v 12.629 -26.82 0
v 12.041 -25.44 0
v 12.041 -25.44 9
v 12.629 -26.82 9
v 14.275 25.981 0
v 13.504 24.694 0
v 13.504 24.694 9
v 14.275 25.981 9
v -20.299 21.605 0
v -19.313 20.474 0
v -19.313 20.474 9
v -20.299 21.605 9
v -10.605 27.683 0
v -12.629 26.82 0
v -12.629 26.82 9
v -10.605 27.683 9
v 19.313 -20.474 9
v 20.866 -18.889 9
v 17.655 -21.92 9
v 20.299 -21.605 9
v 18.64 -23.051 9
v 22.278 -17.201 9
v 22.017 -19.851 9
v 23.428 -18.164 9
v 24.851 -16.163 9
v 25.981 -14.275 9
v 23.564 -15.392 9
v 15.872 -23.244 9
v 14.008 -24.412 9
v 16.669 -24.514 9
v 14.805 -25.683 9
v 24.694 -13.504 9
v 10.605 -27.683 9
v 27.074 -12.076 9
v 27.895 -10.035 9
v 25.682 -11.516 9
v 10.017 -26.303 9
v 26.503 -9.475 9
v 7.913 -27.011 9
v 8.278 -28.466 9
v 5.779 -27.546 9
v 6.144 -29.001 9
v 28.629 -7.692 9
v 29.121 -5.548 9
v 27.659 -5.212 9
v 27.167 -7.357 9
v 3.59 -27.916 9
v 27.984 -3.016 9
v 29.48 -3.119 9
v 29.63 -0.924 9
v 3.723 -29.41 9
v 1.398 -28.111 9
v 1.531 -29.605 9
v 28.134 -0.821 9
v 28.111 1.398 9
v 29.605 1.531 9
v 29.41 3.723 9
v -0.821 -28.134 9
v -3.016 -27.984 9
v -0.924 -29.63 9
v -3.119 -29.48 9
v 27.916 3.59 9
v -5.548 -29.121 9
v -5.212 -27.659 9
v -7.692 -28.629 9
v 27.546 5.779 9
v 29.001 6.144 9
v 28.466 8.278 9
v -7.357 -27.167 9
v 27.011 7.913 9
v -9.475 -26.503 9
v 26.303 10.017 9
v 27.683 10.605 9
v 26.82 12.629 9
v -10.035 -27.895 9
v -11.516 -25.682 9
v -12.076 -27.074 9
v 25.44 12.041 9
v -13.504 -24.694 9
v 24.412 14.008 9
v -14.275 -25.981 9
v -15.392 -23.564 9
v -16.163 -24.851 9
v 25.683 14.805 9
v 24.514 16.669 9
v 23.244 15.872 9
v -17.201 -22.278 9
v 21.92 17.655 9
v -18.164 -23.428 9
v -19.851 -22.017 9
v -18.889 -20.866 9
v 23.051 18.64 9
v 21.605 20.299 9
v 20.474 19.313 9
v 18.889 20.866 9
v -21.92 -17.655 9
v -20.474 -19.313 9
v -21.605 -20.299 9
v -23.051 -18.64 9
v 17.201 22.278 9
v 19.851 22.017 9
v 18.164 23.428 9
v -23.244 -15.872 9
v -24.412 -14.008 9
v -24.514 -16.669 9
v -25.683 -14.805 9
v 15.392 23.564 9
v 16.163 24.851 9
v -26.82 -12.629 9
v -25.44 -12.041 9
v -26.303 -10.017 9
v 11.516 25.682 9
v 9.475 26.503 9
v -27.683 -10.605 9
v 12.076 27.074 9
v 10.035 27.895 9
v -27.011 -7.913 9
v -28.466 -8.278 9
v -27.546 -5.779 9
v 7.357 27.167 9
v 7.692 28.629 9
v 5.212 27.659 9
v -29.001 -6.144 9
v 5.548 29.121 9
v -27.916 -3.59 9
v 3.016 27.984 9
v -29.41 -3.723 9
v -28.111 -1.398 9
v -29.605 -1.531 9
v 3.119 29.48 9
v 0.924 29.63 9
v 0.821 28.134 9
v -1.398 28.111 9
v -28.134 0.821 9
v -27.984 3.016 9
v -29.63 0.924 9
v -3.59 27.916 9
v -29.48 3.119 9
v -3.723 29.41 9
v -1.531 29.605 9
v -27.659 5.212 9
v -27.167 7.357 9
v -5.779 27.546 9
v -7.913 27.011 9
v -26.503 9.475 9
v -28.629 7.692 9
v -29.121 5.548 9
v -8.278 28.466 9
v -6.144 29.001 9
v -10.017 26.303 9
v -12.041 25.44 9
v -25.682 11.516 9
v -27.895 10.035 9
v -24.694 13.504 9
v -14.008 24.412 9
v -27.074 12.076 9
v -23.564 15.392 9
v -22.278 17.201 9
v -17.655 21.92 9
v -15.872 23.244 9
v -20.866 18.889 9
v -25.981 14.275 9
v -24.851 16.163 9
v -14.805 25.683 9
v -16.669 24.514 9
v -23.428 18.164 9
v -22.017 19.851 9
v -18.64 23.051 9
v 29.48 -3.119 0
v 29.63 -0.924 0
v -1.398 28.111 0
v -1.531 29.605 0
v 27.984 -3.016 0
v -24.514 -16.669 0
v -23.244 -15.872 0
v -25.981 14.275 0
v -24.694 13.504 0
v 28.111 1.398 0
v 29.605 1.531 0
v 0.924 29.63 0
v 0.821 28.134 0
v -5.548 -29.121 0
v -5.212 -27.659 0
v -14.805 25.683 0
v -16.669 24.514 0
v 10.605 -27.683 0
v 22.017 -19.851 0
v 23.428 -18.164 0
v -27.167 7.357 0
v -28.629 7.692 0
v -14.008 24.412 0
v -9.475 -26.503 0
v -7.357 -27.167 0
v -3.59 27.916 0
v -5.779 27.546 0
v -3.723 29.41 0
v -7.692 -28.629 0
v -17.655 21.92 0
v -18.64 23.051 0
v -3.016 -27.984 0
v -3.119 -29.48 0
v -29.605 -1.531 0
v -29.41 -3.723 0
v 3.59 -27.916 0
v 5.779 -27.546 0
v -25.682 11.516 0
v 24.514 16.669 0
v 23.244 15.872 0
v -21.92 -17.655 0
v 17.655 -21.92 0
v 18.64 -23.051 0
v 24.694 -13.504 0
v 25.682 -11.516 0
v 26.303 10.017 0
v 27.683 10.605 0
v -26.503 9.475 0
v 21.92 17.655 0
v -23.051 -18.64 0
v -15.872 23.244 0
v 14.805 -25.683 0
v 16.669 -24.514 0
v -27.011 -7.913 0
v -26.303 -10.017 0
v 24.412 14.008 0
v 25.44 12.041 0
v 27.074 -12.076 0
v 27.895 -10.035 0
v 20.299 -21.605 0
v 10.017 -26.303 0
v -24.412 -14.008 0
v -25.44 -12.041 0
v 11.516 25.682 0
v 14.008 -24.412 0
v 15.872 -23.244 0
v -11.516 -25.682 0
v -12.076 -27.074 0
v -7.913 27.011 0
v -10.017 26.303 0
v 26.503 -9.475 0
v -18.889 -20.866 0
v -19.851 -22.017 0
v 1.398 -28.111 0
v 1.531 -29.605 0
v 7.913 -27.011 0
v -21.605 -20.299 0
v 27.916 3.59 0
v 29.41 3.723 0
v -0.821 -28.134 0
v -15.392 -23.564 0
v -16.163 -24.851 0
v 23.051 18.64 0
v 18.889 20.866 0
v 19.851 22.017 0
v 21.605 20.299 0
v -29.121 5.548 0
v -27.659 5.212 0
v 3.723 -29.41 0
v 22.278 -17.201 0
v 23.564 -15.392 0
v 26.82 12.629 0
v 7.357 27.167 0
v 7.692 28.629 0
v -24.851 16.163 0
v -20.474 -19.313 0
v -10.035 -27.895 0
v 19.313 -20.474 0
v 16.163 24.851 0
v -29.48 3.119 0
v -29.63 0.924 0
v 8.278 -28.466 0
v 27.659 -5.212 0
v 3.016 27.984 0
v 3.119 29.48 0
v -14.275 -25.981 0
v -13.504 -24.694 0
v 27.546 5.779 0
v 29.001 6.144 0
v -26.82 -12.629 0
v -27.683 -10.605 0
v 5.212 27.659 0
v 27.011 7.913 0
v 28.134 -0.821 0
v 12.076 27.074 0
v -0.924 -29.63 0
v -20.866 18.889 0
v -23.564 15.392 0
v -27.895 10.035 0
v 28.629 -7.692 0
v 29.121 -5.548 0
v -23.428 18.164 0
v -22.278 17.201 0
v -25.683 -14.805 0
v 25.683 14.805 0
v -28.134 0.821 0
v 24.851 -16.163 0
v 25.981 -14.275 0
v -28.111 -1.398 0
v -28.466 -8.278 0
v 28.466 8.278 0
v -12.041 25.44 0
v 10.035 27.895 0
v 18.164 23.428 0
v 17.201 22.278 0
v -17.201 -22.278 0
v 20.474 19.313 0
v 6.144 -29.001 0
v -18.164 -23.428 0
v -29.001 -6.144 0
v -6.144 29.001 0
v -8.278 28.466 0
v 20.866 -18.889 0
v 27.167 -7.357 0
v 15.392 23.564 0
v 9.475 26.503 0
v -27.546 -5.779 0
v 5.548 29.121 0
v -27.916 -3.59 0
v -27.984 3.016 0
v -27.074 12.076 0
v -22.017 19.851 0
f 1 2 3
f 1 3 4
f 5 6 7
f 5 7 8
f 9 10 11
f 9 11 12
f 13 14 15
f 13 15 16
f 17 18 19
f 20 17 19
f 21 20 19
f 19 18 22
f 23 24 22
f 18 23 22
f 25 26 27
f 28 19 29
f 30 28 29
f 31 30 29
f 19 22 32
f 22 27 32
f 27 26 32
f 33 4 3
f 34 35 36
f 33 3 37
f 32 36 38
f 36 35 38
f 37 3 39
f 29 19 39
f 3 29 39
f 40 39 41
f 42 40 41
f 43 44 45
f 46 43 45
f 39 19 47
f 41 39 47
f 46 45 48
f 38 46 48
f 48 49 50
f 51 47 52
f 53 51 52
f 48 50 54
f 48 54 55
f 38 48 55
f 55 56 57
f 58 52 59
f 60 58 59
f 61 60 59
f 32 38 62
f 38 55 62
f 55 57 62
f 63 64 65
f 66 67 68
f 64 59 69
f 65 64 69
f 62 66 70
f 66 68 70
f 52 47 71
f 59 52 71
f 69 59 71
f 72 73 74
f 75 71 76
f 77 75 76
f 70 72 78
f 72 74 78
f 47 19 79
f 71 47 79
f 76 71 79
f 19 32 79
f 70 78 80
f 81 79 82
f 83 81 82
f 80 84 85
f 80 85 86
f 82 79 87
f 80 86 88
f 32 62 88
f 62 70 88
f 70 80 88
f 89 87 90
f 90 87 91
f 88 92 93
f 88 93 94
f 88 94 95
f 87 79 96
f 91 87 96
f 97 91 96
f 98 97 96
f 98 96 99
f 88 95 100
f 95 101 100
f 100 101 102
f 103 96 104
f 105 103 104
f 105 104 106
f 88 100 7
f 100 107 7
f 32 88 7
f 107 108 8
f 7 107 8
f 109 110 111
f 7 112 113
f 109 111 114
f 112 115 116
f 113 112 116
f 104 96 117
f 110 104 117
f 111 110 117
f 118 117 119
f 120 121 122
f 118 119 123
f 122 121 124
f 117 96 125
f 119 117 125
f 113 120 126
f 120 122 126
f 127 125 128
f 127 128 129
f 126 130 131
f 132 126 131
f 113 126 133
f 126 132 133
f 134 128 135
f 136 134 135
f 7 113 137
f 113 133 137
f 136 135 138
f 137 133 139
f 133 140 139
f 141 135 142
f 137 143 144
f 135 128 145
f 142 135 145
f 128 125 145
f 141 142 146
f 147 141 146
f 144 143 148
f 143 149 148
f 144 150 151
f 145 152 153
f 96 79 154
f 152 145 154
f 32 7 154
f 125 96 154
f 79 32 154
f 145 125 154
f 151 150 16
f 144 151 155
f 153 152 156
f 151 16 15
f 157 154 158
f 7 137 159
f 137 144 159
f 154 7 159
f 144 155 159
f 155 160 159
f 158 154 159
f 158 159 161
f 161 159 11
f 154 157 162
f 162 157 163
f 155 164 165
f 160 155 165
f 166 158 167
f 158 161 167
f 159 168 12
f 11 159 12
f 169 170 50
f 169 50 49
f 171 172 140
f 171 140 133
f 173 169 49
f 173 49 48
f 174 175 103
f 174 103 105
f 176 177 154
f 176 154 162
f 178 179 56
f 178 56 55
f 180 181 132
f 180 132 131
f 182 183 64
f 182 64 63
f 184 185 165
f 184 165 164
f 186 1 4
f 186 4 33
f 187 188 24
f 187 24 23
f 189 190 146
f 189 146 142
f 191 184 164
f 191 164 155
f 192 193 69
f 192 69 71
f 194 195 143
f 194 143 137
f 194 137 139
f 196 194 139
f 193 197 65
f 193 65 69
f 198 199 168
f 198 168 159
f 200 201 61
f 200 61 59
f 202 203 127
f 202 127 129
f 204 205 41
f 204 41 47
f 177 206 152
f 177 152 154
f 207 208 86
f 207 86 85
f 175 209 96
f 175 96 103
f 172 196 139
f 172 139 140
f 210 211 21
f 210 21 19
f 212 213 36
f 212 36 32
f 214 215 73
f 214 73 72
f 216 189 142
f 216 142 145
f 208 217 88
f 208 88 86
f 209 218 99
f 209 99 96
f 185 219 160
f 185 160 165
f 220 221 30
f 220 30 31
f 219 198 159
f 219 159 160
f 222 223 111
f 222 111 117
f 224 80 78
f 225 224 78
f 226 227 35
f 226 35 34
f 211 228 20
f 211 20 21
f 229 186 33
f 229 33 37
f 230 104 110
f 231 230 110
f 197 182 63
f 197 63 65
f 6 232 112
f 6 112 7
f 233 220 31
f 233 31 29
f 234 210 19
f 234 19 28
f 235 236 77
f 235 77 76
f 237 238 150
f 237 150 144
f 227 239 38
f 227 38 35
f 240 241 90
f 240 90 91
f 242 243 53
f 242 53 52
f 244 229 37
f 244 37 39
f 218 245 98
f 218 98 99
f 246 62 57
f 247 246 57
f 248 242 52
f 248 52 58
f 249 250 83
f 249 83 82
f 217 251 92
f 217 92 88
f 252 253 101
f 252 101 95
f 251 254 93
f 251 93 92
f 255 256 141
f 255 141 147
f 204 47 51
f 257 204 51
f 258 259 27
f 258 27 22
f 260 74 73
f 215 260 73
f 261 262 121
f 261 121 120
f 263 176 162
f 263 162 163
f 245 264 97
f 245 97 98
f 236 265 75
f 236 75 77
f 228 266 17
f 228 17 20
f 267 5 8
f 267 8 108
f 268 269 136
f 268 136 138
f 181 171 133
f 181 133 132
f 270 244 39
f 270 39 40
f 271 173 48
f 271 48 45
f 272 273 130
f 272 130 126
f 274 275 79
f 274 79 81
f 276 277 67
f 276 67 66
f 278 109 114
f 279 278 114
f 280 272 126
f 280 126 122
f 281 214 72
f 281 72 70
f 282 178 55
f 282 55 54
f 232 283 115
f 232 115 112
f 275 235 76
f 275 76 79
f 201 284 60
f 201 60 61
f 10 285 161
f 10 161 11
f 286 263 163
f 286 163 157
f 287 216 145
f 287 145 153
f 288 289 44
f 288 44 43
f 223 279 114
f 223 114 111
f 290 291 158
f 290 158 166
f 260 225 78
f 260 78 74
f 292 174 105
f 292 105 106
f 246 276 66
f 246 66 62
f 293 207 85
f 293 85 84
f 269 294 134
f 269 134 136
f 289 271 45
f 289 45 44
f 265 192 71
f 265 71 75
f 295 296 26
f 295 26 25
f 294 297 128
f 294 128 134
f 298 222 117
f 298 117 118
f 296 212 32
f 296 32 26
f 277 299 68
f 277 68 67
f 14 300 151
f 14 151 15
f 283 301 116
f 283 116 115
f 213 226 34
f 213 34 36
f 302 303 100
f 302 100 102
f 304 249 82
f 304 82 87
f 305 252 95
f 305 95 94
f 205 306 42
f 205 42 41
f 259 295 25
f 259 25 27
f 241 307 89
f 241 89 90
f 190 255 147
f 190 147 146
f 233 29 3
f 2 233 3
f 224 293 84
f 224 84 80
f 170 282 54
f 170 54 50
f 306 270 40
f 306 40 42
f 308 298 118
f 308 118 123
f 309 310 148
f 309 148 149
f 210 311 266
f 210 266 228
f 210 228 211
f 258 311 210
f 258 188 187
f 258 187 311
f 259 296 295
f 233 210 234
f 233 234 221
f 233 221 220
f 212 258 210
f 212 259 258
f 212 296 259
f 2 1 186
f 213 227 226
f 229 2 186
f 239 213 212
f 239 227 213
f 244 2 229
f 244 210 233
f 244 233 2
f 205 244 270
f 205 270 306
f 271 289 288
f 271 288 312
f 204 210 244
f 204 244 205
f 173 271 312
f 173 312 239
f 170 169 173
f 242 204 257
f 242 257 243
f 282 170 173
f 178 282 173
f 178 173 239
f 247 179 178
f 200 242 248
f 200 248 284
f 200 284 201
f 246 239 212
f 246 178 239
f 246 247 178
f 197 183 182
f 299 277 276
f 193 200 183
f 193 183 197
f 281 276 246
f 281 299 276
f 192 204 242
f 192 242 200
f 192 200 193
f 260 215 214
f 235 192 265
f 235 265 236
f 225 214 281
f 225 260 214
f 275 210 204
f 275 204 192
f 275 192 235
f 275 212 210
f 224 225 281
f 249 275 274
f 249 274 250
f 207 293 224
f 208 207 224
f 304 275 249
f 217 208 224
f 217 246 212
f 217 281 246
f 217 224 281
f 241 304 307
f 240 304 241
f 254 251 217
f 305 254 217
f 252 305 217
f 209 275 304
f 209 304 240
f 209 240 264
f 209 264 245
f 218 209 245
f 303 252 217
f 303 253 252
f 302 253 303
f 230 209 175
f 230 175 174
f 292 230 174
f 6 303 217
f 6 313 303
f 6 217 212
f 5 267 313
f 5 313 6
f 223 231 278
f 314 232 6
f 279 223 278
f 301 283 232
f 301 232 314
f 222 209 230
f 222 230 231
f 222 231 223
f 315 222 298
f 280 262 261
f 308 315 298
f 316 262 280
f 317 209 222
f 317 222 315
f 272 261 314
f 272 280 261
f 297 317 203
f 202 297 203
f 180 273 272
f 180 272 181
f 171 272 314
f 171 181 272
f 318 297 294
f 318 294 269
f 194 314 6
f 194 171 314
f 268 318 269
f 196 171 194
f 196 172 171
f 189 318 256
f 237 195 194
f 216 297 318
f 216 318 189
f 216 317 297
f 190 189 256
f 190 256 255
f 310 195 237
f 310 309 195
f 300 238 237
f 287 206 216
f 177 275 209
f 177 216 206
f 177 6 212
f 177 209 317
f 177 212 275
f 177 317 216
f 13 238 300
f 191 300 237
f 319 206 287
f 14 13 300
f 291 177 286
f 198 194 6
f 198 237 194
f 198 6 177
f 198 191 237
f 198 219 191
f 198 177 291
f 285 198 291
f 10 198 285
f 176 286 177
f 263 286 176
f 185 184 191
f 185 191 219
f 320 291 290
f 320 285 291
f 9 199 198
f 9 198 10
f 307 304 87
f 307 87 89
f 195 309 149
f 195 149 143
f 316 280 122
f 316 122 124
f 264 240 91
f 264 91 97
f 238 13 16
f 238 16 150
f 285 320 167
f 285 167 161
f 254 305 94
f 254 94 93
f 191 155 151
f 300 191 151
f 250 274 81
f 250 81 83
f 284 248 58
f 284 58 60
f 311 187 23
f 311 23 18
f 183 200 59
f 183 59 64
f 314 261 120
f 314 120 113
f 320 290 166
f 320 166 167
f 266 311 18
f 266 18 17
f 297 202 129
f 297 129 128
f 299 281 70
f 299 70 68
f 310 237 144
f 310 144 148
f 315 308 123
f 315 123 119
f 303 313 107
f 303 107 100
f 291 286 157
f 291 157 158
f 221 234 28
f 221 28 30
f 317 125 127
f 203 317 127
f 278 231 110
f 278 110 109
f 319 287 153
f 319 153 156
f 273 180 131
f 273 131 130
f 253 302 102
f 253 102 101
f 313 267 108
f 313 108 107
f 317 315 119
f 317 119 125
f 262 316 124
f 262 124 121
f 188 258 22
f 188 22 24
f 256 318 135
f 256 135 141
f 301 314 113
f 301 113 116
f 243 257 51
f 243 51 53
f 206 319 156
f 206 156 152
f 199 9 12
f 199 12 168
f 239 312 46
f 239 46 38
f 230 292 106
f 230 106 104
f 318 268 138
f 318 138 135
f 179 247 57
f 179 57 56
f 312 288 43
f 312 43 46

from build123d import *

# Parameters (mm, degrees)
PAD_DEPTH = 9


with BuildPart() as part:
    # Sketch → Pad (new body)
    with BuildSketch(Plane.XY):
        Polygon((-26.503024, 9.47509), (-27.894659, 10.03487), (-27.073648, 12.075934), (-25.682014, 11.516154), (-24.694497, 13.504422), (-25.98143, 14.27501), (-24.851234, 16.162511), (-23.564302, 15.391923), (-22.27791, 17.201231), (-23.428452, 18.163652), (-22.016901, 19.851113), (-20.866359, 18.888692), (-19.312767, 20.474488), (-20.298587, 21.605045), (-18.640438, 23.050915), (-17.654617, 21.920358), (-15.872079, 23.243596), (-16.668904, 24.514449), (-14.804986, 25.683127), (-14.00816, 24.412273), (-12.040568, 25.440369), (-12.628778, 26.820227), (-10.604979, 27.682919), (-10.016776, 26.303077), (-7.912578, 27.010715), (-8.277689, 28.465602), (-6.143855, 29.001097), (-5.778745, 27.546211), (-3.589754, 27.915968), (-3.722775, 29.410059), (-1.531443, 29.605156), (-1.398422, 28.111066), (0.821461, 28.133838), (0.923805, 29.630342), (3.118678, 29.480238), (3.016334, 27.983734), (5.21245, 27.658959), (5.547638, 29.121029), (7.692007, 28.629419), (7.356819, 27.167349), (9.47509, 26.503024), (10.03487, 27.894659), (12.075934, 27.073648), (11.516154, 25.682014), (13.504422, 24.694497), (14.27501, 25.98143), (16.162511, 24.851234), (15.391923, 23.564302), (17.201231, 22.27791), (18.163652, 23.428452), (19.851113, 22.016901), (18.888692, 20.866359), (20.474488, 19.312767), (21.605045, 20.298587), (23.050915, 18.640438), (21.920358, 17.654617), (23.243596, 15.872079), (24.514448, 16.668904), (25.683127, 14.804986), (24.412273, 14.00816), (25.440369, 12.040568), (26.820227, 12.628778), (27.682935, 10.604985), (26.303077, 10.016776), (27.010715, 7.912578), (28.465602, 8.277689), (29.001097, 6.143855), (27.546211, 5.778745), (27.915968, 3.589754), (29.410059, 3.722775), (29.605156, 1.531443), (28.111066, 1.398422), (28.133838, -0.821461), (29.630342, -0.923805), (29.480238, -3.118678), (27.983734, -3.016334), (27.658959, -5.21245), (29.121029, -5.547638), (28.629419, -7.692007), (27.167349, -7.356819), (26.503024, -9.47509), (27.894659, -10.03487), (27.073648, -12.075934), (25.682014, -11.516154), (24.694497, -13.504422), (25.98143, -14.27501), (24.851235, -16.162511), (23.564302, -15.391923), (22.27791, -17.201231), (23.428452, -18.163652), (22.016901, -19.851113), (20.866359, -18.888692), (19.312767, -20.474488), (20.298587, -21.605045), (18.640438, -23.050915), (17.654617, -21.920358), (15.872079, -23.243596), (16.668904, -24.514449), (14.804986, -25.683127), (14.00816, -24.412273), (12.040568, -25.440369), (12.628778, -26.820227), (10.604986, -27.682935), (10.016776, -26.303077), (7.912578, -27.010715), (8.277689, -28.465602), (6.143855, -29.001097), (5.778745, -27.546211), (3.589754, -27.915968), (3.722775, -29.410059), (1.531443, -29.605156), (1.398422, -28.111066), (-0.821461, -28.133838), (-0.923805, -29.630342), (-3.118678, -29.480238), (-3.016334, -27.983734), (-5.21245, -27.658959), (-5.547638, -29.121029), (-7.692007, -28.629419), (-7.356819, -27.167349), (-9.47509, -26.503024), (-10.03487, -27.894659), (-12.075934, -27.073648), (-11.516154, -25.682014), (-13.504422, -24.694497), (-14.27501, -25.98143), (-16.162511, -24.851234), (-15.391923, -23.564302), (-17.201231, -22.27791), (-18.163652, -23.428452), (-19.851113, -22.016901), (-18.888692, -20.866359), (-20.474488, -19.312767), (-21.605045, -20.298587), (-23.050915, -18.640438), (-21.920358, -17.654617), (-23.243596, -15.872079), (-24.514449, -16.668904), (-25.683127, -14.804986), (-24.412273, -14.00816), (-25.440369, -12.040568), (-26.820227, -12.628778), (-27.682935, -10.604985), (-26.303077, -10.016776), (-27.010715, -7.912578), (-28.465602, -8.277689), (-29.001097, -6.143855), (-27.546211, -5.778745), (-27.915968, -3.589754), (-29.410059, -3.722775), (-29.605156, -1.531443), (-28.111066, -1.398422), (-28.133838, 0.821461), (-29.630342, 0.923805), (-29.480238, 3.118678), (-27.983734, 3.016334), (-27.658959, 5.21245), (-29.121029, 5.547638), (-28.629419, 7.692007), (-27.167349, 7.356819), align=None)
    extrude(amount=PAD_DEPTH)


solid = part.part
